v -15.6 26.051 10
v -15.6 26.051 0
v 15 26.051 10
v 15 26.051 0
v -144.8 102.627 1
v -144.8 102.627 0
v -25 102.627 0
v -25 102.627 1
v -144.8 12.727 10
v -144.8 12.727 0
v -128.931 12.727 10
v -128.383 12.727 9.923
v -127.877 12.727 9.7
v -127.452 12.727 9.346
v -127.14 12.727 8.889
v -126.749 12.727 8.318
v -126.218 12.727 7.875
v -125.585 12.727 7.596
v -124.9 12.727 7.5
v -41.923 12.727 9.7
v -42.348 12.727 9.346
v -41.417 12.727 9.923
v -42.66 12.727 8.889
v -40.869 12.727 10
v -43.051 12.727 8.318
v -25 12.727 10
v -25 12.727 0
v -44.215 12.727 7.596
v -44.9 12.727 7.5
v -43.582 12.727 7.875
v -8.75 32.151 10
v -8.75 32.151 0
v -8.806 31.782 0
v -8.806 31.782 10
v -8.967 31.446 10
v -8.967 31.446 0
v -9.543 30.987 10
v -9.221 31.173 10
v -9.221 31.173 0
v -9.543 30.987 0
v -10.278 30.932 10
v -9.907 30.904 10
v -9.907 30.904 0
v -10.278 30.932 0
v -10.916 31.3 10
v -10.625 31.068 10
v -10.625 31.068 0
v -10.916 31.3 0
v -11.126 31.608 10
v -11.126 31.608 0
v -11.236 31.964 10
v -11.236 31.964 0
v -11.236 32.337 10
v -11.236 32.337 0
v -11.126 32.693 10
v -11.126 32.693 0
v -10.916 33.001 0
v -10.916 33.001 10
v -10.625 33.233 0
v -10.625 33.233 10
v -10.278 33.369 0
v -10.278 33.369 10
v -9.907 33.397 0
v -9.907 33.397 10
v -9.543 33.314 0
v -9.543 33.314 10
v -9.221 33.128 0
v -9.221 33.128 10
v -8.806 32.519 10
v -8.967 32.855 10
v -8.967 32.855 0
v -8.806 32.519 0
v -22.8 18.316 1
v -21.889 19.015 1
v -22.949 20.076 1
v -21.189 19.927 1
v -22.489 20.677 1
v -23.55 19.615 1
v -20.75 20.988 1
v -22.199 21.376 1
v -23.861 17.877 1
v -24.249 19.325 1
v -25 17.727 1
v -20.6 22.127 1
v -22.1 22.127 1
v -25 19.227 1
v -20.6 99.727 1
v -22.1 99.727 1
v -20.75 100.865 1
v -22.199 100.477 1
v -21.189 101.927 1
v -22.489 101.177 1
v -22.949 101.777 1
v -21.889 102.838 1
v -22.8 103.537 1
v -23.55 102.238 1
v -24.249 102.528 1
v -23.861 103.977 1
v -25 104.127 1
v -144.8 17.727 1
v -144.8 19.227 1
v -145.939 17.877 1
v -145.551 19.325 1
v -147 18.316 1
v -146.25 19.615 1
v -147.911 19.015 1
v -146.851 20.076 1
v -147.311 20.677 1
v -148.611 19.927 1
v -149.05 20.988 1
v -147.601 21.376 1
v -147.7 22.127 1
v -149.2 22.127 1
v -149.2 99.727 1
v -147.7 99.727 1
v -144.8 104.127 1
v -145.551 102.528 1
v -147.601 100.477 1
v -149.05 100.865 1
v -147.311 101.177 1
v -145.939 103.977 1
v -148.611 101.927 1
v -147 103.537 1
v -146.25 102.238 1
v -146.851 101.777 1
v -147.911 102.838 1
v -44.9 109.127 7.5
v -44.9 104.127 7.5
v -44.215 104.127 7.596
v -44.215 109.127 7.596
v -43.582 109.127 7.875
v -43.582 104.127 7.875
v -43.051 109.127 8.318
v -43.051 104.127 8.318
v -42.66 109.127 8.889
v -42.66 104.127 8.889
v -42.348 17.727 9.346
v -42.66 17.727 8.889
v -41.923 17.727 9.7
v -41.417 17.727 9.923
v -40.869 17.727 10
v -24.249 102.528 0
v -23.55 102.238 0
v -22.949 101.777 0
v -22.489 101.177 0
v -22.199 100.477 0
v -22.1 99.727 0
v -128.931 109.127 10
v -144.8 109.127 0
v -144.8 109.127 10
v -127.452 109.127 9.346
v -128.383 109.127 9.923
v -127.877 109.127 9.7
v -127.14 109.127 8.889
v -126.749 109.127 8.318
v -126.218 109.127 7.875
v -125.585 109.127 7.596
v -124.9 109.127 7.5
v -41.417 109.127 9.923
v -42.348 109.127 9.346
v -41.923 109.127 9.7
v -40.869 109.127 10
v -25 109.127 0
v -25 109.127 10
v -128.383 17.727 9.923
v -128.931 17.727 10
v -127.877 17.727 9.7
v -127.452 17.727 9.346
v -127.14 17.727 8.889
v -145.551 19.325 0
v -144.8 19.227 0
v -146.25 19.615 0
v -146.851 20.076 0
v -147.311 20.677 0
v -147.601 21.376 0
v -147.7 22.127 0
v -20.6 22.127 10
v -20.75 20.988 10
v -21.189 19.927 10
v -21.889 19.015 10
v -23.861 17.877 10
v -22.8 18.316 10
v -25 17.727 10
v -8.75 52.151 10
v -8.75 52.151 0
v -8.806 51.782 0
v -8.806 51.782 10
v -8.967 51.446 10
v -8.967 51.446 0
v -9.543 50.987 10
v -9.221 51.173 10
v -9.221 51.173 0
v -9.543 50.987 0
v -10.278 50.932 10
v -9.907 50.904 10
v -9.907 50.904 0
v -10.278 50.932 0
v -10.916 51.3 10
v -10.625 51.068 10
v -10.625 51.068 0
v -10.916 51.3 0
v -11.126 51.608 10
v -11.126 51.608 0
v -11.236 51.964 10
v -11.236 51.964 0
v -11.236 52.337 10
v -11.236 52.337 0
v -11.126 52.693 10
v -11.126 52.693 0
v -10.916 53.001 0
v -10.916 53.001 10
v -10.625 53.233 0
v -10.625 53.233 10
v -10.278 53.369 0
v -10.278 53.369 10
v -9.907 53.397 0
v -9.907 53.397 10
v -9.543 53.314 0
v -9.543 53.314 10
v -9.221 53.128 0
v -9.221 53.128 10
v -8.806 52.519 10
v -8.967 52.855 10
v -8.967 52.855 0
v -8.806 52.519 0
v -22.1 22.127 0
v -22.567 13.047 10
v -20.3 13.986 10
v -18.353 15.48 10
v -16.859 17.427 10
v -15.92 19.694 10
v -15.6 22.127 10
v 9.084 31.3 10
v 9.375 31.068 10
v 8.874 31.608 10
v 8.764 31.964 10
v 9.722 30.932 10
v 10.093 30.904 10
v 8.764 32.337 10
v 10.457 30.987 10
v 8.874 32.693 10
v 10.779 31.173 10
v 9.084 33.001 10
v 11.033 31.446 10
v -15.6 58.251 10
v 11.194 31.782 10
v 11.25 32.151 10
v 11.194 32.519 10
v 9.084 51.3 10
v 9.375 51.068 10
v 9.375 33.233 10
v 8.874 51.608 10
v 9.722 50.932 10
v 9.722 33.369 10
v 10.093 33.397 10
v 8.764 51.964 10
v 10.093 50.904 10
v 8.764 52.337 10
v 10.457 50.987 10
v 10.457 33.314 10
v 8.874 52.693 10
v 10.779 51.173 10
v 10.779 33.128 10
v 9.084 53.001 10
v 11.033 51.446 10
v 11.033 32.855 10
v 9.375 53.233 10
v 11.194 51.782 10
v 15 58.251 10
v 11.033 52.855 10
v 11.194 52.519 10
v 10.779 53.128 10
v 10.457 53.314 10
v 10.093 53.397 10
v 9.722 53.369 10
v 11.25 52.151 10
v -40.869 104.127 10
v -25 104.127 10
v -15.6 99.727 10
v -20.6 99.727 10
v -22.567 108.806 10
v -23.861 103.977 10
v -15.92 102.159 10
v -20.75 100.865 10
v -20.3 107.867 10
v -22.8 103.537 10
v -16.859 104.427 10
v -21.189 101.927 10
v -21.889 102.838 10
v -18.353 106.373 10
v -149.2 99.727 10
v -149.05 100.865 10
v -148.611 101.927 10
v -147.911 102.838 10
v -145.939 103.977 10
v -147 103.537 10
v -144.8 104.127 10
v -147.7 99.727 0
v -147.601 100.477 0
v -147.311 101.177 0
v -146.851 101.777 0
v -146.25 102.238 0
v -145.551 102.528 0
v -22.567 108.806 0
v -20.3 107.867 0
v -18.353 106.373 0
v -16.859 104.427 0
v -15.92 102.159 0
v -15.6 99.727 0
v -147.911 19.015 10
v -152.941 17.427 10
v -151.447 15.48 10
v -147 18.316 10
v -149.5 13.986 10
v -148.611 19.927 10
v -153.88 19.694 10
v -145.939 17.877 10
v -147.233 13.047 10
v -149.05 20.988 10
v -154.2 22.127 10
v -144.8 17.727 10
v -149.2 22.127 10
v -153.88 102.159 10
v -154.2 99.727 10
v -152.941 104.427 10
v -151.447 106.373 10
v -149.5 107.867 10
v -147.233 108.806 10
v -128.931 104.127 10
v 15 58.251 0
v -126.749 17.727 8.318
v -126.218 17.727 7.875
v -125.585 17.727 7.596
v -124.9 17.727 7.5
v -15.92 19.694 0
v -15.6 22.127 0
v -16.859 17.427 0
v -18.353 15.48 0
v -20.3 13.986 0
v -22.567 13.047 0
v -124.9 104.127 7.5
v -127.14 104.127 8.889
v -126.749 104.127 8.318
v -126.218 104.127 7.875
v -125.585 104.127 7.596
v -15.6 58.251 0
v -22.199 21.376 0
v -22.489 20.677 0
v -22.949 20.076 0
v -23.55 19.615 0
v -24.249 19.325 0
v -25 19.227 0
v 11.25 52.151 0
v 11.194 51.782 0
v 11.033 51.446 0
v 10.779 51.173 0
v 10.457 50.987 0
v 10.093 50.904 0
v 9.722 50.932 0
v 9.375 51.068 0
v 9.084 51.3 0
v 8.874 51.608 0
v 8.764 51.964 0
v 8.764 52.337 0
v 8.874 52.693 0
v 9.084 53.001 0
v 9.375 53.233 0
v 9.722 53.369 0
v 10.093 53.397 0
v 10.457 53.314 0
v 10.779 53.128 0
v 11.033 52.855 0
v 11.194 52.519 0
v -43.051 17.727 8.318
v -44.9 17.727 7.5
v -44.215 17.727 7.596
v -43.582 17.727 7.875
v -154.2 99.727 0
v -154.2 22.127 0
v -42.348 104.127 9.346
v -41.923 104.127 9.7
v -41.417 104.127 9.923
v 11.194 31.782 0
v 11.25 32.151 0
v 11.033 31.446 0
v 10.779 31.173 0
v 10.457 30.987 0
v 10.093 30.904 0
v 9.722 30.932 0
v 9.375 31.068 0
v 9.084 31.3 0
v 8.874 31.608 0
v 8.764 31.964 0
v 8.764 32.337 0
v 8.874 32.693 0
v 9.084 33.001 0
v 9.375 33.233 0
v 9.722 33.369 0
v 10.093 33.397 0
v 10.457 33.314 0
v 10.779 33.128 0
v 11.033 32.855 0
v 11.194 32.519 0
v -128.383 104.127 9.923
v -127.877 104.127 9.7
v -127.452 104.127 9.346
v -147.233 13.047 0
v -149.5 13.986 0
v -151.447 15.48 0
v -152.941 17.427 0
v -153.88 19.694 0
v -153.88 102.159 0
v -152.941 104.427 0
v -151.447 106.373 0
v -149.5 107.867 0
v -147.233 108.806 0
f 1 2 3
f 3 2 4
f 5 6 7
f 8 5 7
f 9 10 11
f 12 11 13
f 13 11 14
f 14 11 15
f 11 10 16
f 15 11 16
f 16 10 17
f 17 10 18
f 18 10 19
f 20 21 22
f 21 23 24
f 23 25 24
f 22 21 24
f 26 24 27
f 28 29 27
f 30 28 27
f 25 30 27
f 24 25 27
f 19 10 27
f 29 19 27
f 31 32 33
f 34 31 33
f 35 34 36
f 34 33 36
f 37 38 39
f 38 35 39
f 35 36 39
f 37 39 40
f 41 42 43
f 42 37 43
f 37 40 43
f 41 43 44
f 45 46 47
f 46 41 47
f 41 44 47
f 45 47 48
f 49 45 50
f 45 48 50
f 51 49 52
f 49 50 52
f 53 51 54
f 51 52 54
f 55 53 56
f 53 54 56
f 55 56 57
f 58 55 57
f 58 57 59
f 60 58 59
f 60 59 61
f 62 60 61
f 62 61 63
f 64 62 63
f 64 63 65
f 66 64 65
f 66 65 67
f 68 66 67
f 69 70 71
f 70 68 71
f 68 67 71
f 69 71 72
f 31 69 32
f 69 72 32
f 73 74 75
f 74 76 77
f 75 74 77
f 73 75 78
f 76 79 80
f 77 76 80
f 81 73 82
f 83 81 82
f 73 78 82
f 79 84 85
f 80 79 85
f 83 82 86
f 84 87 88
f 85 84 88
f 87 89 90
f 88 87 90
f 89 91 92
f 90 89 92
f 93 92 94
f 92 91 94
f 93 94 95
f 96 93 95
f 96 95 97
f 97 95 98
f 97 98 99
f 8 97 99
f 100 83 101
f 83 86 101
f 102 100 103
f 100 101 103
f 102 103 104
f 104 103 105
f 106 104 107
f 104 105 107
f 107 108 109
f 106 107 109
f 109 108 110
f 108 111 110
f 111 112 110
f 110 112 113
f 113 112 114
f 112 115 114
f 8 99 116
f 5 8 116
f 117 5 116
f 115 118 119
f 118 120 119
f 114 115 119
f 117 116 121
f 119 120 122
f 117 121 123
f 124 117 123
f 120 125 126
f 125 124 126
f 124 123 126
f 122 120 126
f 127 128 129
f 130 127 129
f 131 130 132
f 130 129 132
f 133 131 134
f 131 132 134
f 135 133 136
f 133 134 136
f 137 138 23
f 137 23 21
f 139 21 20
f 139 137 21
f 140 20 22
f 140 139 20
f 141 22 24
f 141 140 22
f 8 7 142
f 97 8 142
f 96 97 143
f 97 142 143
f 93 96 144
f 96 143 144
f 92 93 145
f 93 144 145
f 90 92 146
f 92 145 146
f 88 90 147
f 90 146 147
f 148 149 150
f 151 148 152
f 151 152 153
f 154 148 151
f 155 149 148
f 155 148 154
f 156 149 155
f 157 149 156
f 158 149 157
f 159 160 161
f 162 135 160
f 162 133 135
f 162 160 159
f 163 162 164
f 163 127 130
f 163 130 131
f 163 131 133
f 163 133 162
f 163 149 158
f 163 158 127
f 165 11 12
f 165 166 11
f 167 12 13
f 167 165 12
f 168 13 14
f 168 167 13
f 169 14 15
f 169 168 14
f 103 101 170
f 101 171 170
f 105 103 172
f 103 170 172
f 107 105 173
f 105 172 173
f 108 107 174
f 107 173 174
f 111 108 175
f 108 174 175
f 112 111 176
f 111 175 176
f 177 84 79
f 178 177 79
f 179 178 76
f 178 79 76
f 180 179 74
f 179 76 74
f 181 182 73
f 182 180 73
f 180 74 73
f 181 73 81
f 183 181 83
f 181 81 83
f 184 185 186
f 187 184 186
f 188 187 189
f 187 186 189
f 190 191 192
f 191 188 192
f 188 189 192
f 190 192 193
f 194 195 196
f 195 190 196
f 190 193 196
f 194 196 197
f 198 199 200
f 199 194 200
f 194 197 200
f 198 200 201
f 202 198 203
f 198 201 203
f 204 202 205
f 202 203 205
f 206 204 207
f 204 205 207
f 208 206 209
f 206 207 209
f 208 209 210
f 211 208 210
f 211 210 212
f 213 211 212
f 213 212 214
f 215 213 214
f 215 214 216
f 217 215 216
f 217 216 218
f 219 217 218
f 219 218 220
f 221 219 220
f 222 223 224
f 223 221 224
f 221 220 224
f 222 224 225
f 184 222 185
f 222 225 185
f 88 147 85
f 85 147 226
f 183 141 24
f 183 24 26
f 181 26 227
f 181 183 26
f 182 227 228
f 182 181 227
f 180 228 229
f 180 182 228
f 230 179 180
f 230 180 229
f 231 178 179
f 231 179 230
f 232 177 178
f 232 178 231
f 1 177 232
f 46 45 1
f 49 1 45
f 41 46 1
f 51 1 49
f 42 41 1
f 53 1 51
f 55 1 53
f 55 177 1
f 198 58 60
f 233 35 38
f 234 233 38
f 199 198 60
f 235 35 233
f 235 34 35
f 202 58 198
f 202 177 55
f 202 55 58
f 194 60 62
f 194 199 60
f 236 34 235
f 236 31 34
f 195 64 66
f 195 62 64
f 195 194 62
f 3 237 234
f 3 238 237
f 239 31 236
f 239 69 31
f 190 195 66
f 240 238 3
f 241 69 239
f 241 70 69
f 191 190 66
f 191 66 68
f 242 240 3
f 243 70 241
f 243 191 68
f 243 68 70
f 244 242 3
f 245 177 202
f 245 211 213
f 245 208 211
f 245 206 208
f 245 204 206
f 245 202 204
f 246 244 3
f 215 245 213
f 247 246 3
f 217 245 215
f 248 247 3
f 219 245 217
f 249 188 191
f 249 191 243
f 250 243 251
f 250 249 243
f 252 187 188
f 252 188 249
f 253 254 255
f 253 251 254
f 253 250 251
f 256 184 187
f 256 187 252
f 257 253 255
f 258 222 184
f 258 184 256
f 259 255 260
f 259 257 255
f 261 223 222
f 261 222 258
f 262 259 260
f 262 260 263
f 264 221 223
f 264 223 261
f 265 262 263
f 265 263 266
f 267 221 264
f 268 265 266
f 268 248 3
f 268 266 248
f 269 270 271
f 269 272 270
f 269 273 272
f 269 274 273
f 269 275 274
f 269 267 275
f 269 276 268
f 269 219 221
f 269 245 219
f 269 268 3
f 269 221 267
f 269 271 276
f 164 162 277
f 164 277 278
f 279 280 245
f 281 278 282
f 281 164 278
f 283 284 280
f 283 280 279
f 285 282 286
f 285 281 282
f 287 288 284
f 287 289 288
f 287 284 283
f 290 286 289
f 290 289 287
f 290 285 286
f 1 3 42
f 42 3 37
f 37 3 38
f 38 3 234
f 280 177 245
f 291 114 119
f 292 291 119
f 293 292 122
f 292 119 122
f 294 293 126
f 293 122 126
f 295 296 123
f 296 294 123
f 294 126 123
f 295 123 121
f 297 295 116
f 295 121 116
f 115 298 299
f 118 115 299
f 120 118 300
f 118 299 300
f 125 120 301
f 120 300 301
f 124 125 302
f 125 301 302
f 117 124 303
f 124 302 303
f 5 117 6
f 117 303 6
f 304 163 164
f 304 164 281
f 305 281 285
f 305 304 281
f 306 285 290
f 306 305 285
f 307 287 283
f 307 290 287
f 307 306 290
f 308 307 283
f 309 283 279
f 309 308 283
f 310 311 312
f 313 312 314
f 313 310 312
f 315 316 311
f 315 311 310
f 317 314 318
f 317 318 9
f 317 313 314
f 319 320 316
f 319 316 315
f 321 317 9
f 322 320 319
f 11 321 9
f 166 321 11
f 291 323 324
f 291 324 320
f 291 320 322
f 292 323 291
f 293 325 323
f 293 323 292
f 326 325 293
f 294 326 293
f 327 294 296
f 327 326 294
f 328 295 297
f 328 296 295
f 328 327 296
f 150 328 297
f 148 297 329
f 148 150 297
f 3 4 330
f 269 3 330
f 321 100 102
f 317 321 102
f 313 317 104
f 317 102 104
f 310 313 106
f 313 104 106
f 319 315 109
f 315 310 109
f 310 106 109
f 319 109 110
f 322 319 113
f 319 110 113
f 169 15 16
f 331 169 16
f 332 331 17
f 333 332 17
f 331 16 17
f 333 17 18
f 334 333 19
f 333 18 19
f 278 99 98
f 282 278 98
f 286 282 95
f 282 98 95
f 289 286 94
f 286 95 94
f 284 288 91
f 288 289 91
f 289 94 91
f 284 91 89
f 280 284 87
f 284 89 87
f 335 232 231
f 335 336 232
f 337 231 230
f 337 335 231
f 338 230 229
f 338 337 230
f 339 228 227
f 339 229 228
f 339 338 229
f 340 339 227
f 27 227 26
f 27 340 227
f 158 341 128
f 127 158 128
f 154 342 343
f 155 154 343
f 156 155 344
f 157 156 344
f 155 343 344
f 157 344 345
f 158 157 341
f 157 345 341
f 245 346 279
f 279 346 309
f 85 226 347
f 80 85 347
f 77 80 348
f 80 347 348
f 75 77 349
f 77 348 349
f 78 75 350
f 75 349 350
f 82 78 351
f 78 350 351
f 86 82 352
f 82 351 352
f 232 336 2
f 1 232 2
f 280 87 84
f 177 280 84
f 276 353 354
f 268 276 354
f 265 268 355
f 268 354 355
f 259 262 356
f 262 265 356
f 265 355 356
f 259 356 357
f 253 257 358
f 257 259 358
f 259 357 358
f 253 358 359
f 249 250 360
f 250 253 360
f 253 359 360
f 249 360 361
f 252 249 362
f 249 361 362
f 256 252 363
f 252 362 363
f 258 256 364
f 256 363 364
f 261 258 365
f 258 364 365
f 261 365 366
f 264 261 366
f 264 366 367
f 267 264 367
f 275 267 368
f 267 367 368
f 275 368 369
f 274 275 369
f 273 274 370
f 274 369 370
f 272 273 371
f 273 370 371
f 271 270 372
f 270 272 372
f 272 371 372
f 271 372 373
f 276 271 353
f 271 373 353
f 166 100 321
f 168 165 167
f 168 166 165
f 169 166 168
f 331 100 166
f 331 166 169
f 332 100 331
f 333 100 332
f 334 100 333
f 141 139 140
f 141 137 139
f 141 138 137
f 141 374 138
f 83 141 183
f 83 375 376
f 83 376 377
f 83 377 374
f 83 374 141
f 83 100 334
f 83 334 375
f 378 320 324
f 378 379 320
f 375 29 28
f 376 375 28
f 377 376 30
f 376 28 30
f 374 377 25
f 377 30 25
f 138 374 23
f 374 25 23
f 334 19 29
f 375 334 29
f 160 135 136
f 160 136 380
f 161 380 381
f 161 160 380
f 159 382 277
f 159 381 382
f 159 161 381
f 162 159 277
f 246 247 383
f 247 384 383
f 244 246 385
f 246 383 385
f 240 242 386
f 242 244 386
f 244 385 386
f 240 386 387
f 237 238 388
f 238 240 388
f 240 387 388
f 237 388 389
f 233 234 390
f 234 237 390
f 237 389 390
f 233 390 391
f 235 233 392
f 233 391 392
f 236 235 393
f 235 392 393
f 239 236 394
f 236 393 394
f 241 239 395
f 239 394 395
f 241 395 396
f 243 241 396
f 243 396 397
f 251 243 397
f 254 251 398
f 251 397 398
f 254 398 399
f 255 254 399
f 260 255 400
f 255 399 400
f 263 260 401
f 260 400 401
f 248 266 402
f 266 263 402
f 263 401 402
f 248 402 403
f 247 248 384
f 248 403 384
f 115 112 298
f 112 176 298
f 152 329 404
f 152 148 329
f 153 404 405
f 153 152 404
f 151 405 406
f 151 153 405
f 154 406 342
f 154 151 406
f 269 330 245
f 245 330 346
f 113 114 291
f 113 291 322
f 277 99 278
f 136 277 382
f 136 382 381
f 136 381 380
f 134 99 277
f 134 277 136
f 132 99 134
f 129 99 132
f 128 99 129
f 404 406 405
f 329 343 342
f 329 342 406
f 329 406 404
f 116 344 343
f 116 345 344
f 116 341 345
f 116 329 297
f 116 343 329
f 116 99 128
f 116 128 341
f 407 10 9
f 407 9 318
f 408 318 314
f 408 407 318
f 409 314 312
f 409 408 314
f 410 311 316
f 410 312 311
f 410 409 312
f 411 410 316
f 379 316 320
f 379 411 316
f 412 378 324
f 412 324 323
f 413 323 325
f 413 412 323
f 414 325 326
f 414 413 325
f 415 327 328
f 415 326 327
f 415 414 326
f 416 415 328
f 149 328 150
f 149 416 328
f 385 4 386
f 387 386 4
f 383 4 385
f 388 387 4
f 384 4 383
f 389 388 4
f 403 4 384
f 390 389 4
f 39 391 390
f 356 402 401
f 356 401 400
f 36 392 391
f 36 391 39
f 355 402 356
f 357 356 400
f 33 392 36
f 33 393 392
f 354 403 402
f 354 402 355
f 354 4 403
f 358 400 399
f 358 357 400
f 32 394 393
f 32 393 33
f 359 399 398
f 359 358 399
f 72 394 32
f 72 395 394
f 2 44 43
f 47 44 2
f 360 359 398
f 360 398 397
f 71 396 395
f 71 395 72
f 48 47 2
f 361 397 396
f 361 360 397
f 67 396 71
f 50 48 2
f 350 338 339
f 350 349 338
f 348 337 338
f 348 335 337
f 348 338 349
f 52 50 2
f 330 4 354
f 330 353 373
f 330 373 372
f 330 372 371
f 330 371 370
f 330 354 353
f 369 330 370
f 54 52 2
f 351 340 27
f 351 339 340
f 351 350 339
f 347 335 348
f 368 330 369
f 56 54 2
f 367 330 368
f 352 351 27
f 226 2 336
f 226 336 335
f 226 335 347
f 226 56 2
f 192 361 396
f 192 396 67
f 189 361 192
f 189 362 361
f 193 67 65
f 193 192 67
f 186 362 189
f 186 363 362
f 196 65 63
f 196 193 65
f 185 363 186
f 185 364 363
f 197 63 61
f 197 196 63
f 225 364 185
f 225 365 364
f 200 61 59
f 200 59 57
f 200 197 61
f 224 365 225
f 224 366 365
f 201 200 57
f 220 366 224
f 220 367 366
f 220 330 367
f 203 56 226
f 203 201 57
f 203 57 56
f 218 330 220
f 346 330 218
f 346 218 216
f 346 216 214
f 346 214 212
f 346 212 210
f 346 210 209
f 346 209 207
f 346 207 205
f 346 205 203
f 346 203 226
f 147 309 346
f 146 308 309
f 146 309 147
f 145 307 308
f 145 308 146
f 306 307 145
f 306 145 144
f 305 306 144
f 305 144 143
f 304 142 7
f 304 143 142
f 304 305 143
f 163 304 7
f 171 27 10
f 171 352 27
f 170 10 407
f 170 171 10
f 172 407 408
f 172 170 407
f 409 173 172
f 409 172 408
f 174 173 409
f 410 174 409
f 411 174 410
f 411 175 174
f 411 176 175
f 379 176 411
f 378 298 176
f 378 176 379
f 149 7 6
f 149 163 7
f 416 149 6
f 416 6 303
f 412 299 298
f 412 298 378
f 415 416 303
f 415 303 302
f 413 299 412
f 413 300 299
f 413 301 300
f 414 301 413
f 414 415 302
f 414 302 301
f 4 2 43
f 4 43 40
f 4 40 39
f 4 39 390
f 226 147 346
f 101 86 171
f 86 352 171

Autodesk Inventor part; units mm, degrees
ref_plane "YZ Plane" through (0, 0, 0) normal (1, 0, 0) x (0, 1, 0)
ref_plane "XZ Plane" through (0, 0, 0) normal (0, 1, 0) x (-1, 0, 0)
ref_plane "XY Plane" through (0, 0, 0) normal (0, 0, 1) x (1, 0, 0)
ref_plane "Arbeitsebene1" through (-6.2499, 0, 0) normal (0, 0, 1) x (1, 0, 0)
sketch "Skizze1" plane through (-6.2499, 0, 0) normal (0, 0, 1) x (1, 0, 0)
  line L0 (21.2499, 26.0506) -> (21.2499, 58.2506)
  line L1 (21.2499, 58.2506) -> (-8.7501, 58.2506)
  line L2 (-8.7501, 58.2506) -> (-8.7501, 26.0506)
  line L3 (-8.7501, 26.0506) -> (21.2499, 26.0506)
  circle A0 centre (16.2499, 32.1506) radius 1.25
  circle A1 centre (-3.7501, 32.1506) radius 1.25
  circle A2 centre (-3.7501, 52.1506) radius 1.25
  circle A3 centre (16.2499, 52.1506) radius 1.25
  circle A4 centre (13.7499, 38.0506) radius 3.25
  circle A5 centre (13.7499, 46.2506) radius 3.25
  circle A6 centre (-1.2501, 38.0506) radius 3.25
  circle A7 centre (-1.2501, 46.2506) radius 3.25
  line L4 (-67.7501, 103.2266) -> (-67.7501, 101.9266) construction
  line L5 (-18.7501, 103.2266) -> (-67.7501, 103.2266) construction
  arc A8 (-15.2501, 99.7266) -> (-18.7501, 103.2266) centre (-18.7501, 99.7266) ccw construction
  line L6 (-15.2501, 22.1266) -> (-15.2501, 99.7266) construction
  arc A9 (-18.7501, 18.6266) -> (-15.2501, 22.1266) centre (-18.7501, 22.1266) ccw construction
  line L7 (-67.7501, 18.6266) -> (-18.7501, 18.6266) construction
  line L8 (-67.7501, 19.9266) -> (-67.7501, 18.6266) construction
  line L9 (-23.4028, 19.9266) -> (-67.7501, 19.9266) construction
  arc A10 (-23.4028, 19.9266) -> (-21.8472, 20.571) centre (-23.4028, 22.1266) ccw construction
  line L10 (-17.1945, 25.2237) -> (-21.8472, 20.571) construction
  arc A11 (-17.1945, 25.2237) -> (-16.5501, 26.7793) centre (-18.7501, 26.7793) ccw construction
  line L11 (-16.5501, 95.0739) -> (-16.5501, 26.7793) construction
  arc A12 (-16.5501, 95.0739) -> (-17.1945, 96.6296) centre (-18.7501, 95.0739) ccw construction
  line L12 (-21.8472, 101.2823) -> (-17.1945, 96.6296) construction
  arc A13 (-21.8472, 101.2823) -> (-23.4028, 101.9266) centre (-23.4028, 99.7266) ccw construction
  line L13 (-67.7501, 101.9266) -> (-23.4028, 101.9266) construction
  arc A14 (-18.7501, 18.2266) -> (-14.8501, 22.1266) centre (-18.7501, 22.1266) ccw construction
  line L14 (-14.8501, 22.1266) -> (-14.8501, 99.7266) construction
  line L15 (-18.7501, 103.6266) -> (-68.1501, 103.6266) construction
  line L16 (-68.1501, 103.6266) -> (-68.1501, 101.5266) construction
  line L17 (-68.1501, 101.5266) -> (-23.4028, 101.5266) construction
  arc A15 (-22.13, 100.9994) -> (-23.4028, 101.5266) centre (-23.4028, 99.7266) ccw construction
  line L18 (-22.13, 100.9994) -> (-17.4773, 96.3467) construction
  arc A16 (-16.9501, 95.0739) -> (-17.4773, 96.3467) centre (-18.7501, 95.0739) ccw construction
  line L19 (-16.9501, 95.0739) -> (-16.9501, 26.7793) construction
  arc A17 (-17.4773, 25.5065) -> (-16.9501, 26.7793) centre (-18.7501, 26.7793) ccw construction
  line L20 (-17.4773, 25.5065) -> (-22.13, 20.8538) construction
  arc A18 (-23.4028, 20.3266) -> (-22.13, 20.8538) centre (-23.4028, 22.1266) ccw construction
  line L21 (-23.4028, 20.3266) -> (-68.1501, 20.3266) construction
  line L22 (-68.1501, 20.3266) -> (-68.1501, 18.2266) construction
  line L23 (-68.1501, 18.2266) -> (-18.7501, 18.2266) construction
  arc A19 (-18.7501, 18.2266) -> (-14.8501, 22.1266) centre (-18.7501, 22.1266) ccw construction
  line L24 (-14.8501, 22.1266) -> (-14.8501, 99.7266) construction
  arc A20 (-14.8501, 99.7266) -> (-18.7501, 103.6266) centre (-18.7501, 99.7266) ccw construction
  line L25 (-89.5501, 101.9266) -> (-89.5501, 103.2266) construction
  line L26 (-138.8501, 101.9266) -> (-89.5501, 101.9266) construction
  arc A21 (-138.8501, 101.9266) -> (-140.7501, 100.0266) centre (-138.8501, 100.0266) ccw construction
  line L27 (-140.7501, 21.8266) -> (-140.7501, 100.0266) construction
  arc A22 (-140.7501, 21.8266) -> (-138.8501, 19.9266) centre (-138.8501, 21.8266) ccw construction
  line L28 (-89.5501, 19.9266) -> (-138.8501, 19.9266) construction
  line L29 (-89.5501, 18.6266) -> (-89.5501, 19.9266) construction
  line L30 (-138.5501, 18.6266) -> (-89.5501, 18.6266) construction
  arc A23 (-142.0501, 22.1266) -> (-138.5501, 18.6266) centre (-138.5501, 22.1266) ccw construction
  line L31 (-142.0501, 99.7266) -> (-142.0501, 22.1266) construction
  arc A24 (-138.5501, 103.2266) -> (-142.0501, 99.7266) centre (-138.5501, 99.7266) ccw construction
  line L32 (-89.5501, 103.2266) -> (-138.5501, 103.2266) construction
  arc A25 (-138.5501, 103.6266) -> (-142.4501, 99.7266) centre (-138.5501, 99.7266) ccw construction
  line L33 (-142.4501, 99.7266) -> (-142.4501, 22.1266) construction
  arc A26 (-142.4501, 22.1266) -> (-138.5501, 18.2266) centre (-138.5501, 22.1266) ccw construction
  line L34 (-138.5501, 18.2266) -> (-89.1501, 18.2266) construction
  line L35 (-89.1501, 18.2266) -> (-89.1501, 20.3266) construction
  line L36 (-89.1501, 20.3266) -> (-138.8501, 20.3266) construction
  arc A27 (-140.3501, 21.8266) -> (-138.8501, 20.3266) centre (-138.8501, 21.8266) ccw construction
  line L37 (-140.3501, 21.8266) -> (-140.3501, 100.0266) construction
  arc A28 (-138.8501, 101.5266) -> (-140.3501, 100.0266) centre (-138.8501, 100.0266) ccw construction
  line L38 (-138.8501, 101.5266) -> (-89.1501, 101.5266) construction
  line L39 (-89.1501, 101.5266) -> (-89.1501, 103.6266) construction
  line L40 (-89.1501, 103.6266) -> (-138.5501, 103.6266) construction
  line L41 (-68.6501, 104.1266) -> (-18.7501, 104.1266)
  arc A29 (-14.3501, 99.7266) -> (-18.7501, 104.1266) centre (-18.7501, 99.7266) ccw
  line L42 (-14.3501, 99.7266) -> (-14.3501, 22.1266)
  arc A30 (-18.7501, 17.7266) -> (-14.3501, 22.1266) centre (-18.7501, 22.1266) ccw
  line L43 (-18.7501, 17.7266) -> (-68.6501, 17.7266)
  line L44 (-68.6501, 17.7266) -> (-68.6501, 20.8266)
  line L45 (-68.6501, 20.8266) -> (-23.4028, 20.8266)
  arc A31 (-23.4028, 20.8266) -> (-22.4836, 21.2074) centre (-23.4028, 22.1266) ccw
  line L46 (-22.4836, 21.2074) -> (-17.8309, 25.8601)
  arc A32 (-17.8309, 25.8601) -> (-17.4501, 26.7793) centre (-18.7501, 26.7793) ccw
  line L47 (-17.4501, 26.7793) -> (-17.4501, 95.0739)
  arc A33 (-17.4501, 95.0739) -> (-17.8309, 95.9932) centre (-18.7501, 95.0739) ccw
  line L48 (-17.8309, 95.9932) -> (-22.4836, 100.6459)
  arc A34 (-22.4836, 100.6459) -> (-23.4028, 101.0266) centre (-23.4028, 99.7266) ccw
  line L49 (-23.4028, 101.0266) -> (-68.6501, 101.0266)
  line L50 (-68.6501, 101.0266) -> (-68.6501, 104.1266)
  arc A35 (-138.5501, 104.1266) -> (-142.9501, 99.7266) centre (-138.5501, 99.7266) ccw
  line L51 (-142.9501, 99.7266) -> (-142.9501, 22.1266)
  arc A36 (-142.9501, 22.1266) -> (-138.5501, 17.7266) centre (-138.5501, 22.1266) ccw
  line L52 (-138.5501, 17.7266) -> (-88.6501, 17.7266)
  line L53 (-88.6501, 17.7266) -> (-88.6501, 20.8266)
  line L54 (-88.6501, 20.8266) -> (-138.8501, 20.8266)
  arc A37 (-139.8501, 21.8266) -> (-138.8501, 20.8266) centre (-138.8501, 21.8266) ccw
  line L55 (-139.8501, 21.8266) -> (-139.8501, 100.0266)
  arc A38 (-138.8501, 101.0266) -> (-139.8501, 100.0266) centre (-138.8501, 100.0266) ccw
  line L56 (-138.8501, 101.0266) -> (-88.6501, 101.0266)
  line L57 (-88.6501, 101.0266) -> (-88.6501, 104.1266)
  line L58 (-88.6501, 104.1266) -> (-138.5501, 104.1266)
  line L59 (-68.6501, 104.1266) -> (-88.6501, 104.1266)
  line L60 (-88.6501, 17.7266) -> (-68.6501, 17.7266)
  line L61 (-94.9, 12.7266) -> (-138.5501, 12.7266)
  arc A39 (-147.9501, 22.1266) -> (-138.5501, 12.7266) centre (-138.5501, 22.1266) ccw
  line L62 (-147.9501, 22.1266) -> (-147.9501, 99.7266)
  arc A40 (-138.5501, 109.1266) -> (-147.9501, 99.7266) centre (-138.5501, 99.7266) ccw
  line L63 (-138.5501, 109.1266) -> (-94.9, 109.1266)
  line L64 (-74.9, 12.7266) -> (-18.7501, 12.7266)
  arc A41 (-18.7501, 12.7266) -> (-9.3501, 22.1266) centre (-18.7501, 22.1266) ccw
  line L65 (-9.3501, 22.1266) -> (-9.3501, 99.7266)
  arc A42 (-9.3501, 99.7266) -> (-18.7501, 109.1266) centre (-18.7501, 99.7266) ccw
  line L66 (-18.7501, 109.1266) -> (-74.9, 109.1266)
  line L67 (-94.9, 12.7266) -> (-74.9, 12.7266)
  line L68 (-74.9, 109.1266) -> (-94.9, 109.1266)
  line L69 (-8.7501, 58.2506) -> (-9.3501, 58.2506)
  line L70 (-8.7501, 26.0506) -> (-9.3501, 26.0506)
  point P0 (6.2499, 0)
  point P1 (-12.4751, 58.2506)
  point P2 (-12.4751, 26.0506)
  point P3 (-12.4751, 26.0506)
  dimension "d0" = 0
  dimension "d1" = 0
  dimension "d2" = 0.5
  dimension "d3" = 0.5
  dimension "d4" = 5
  dimension "d5" = 5
extrude "Extrusion1" add sketch "Skizze1" along normal blind 10 contours L3 L2 L1 L0 | L70 L65 L69 L2 | L65 A41 L64 L67 L61 A39 L62 A40 L63 L68 L66 A42 | A4 | A5 | A6 | A7
sketch "Skizze3" plane through (-6.2499, 0, 0) normal (0, 0, -1) x (-1, 0, 0)
  line L0 (9.3501, 26.0506) -> (-21.2499, 26.0506)
  line L1 (9.3501, 22.1266) -> (9.3501, 26.0506)
  arc A0 (9.3501, 22.1266) -> (18.7501, 12.7266) centre (18.7501, 22.1266) ccw
  line L2 (138.5501, 12.7266) -> (18.7501, 12.7266)
  arc A1 (138.5501, 12.7266) -> (147.9501, 22.1266) centre (138.5501, 22.1266) ccw
  line L3 (147.9501, 99.7266) -> (147.9501, 22.1266)
  arc A2 (147.9501, 99.7266) -> (138.5501, 109.1266) centre (138.5501, 99.7266) ccw
  line L4 (18.7501, 109.1266) -> (138.5501, 109.1266)
  arc A3 (18.7501, 109.1266) -> (9.3501, 99.7266) centre (18.7501, 99.7266) ccw
  line L5 (9.3501, 58.2506) -> (9.3501, 99.7266)
  line L6 (-21.2499, 58.2506) -> (9.3501, 58.2506)
  line L7 (-21.2499, 26.0506) -> (-21.2499, 58.2506)
  circle A4 centre (-16.2499, 32.1506) radius 1.25
  circle A5 centre (3.7501, 32.1506) radius 1.25
  circle A6 centre (3.7501, 52.1506) radius 1.25
  circle A7 centre (-16.2499, 52.1506) radius 1.25
  line L8 (18.7501, 17.7266) -> (138.5501, 17.7266)
  arc A8 (14.3501, 22.1266) -> (18.7501, 17.7266) centre (18.7501, 22.1266) ccw
  line L9 (14.3501, 99.7266) -> (14.3501, 22.1266)
  arc A9 (18.7501, 104.1266) -> (14.3501, 99.7266) centre (18.7501, 99.7266) ccw
  line L10 (138.5501, 104.1266) -> (18.7501, 104.1266)
  arc A10 (142.9501, 99.7266) -> (138.5501, 104.1266) centre (138.5501, 99.7266) ccw
  line L11 (142.9501, 22.1266) -> (142.9501, 99.7266)
  arc A11 (138.5501, 17.7266) -> (142.9501, 22.1266) centre (138.5501, 22.1266) ccw
  arc A12 (141.4501, 99.7266) -> (138.5501, 102.6266) centre (138.5501, 99.7266) ccw
  line L12 (138.5501, 102.6266) -> (18.7501, 102.6266)
  arc A13 (18.7501, 102.6266) -> (15.8501, 99.7266) centre (18.7501, 99.7266) ccw
  line L13 (15.8501, 99.7266) -> (15.8501, 22.1266)
  arc A14 (15.8501, 22.1266) -> (18.7501, 19.2266) centre (18.7501, 22.1266) ccw
  line L14 (18.7501, 19.2266) -> (138.5501, 19.2266)
  arc A15 (138.5501, 19.2266) -> (141.4501, 22.1266) centre (138.5501, 22.1266) ccw
  line L15 (141.4501, 22.1266) -> (141.4501, 99.7266)
  point P0 (-6.2499, 0)
  dimension "d11" = 1.5
extrude "Extrusion3" add sketch "Skizze3" against normal blind 1 contours A8 L9 A9 L10 A10 L11 A11 L8
sketch "Skizze4" plane through (-144.8, 12.7266, 0) normal (0, -1, 0) x (1, 0, 0)
  line L0 (0, 10) -> (119.8, 10)
  line L1 (19.9, 10) -> (99.9, 10) construction
  line L2 (0, 10) -> (119.8, 10)
  line L3 (19.9, 7.5) -> (99.9, 7.5)
  line L4 (99.9, 12.5) -> (19.9, 12.5)
  arc A0 (19.9, 12.5) -> (19.9, 7.5) centre (19.9, 10) ccw
  arc A1 (99.9, 7.5) -> (99.9, 12.5) centre (99.9, 10) ccw
  point P0 (144.8, 0)
  point P1 (59.9, 10)
  point P2 (102.4, 10)
  point P3 (17.4, 10)
  dimension "d14" = 40
  dimension "d18" = 5
extrude "Extrusion4" cut sketch "Skizze4" against normal through all contours L0 A1 L3 A0
fillet "Rundung1" radius 2 4 edges at (-127.4, 15.2266, 10) (-127.4, 106.6266, 10) (-42.4, 106.6266, 10) (-42.4, 15.2266, 10)
properties part number "20_Cube_Insert_Linear_Stage_NEMA11_china_wellplatemount"
